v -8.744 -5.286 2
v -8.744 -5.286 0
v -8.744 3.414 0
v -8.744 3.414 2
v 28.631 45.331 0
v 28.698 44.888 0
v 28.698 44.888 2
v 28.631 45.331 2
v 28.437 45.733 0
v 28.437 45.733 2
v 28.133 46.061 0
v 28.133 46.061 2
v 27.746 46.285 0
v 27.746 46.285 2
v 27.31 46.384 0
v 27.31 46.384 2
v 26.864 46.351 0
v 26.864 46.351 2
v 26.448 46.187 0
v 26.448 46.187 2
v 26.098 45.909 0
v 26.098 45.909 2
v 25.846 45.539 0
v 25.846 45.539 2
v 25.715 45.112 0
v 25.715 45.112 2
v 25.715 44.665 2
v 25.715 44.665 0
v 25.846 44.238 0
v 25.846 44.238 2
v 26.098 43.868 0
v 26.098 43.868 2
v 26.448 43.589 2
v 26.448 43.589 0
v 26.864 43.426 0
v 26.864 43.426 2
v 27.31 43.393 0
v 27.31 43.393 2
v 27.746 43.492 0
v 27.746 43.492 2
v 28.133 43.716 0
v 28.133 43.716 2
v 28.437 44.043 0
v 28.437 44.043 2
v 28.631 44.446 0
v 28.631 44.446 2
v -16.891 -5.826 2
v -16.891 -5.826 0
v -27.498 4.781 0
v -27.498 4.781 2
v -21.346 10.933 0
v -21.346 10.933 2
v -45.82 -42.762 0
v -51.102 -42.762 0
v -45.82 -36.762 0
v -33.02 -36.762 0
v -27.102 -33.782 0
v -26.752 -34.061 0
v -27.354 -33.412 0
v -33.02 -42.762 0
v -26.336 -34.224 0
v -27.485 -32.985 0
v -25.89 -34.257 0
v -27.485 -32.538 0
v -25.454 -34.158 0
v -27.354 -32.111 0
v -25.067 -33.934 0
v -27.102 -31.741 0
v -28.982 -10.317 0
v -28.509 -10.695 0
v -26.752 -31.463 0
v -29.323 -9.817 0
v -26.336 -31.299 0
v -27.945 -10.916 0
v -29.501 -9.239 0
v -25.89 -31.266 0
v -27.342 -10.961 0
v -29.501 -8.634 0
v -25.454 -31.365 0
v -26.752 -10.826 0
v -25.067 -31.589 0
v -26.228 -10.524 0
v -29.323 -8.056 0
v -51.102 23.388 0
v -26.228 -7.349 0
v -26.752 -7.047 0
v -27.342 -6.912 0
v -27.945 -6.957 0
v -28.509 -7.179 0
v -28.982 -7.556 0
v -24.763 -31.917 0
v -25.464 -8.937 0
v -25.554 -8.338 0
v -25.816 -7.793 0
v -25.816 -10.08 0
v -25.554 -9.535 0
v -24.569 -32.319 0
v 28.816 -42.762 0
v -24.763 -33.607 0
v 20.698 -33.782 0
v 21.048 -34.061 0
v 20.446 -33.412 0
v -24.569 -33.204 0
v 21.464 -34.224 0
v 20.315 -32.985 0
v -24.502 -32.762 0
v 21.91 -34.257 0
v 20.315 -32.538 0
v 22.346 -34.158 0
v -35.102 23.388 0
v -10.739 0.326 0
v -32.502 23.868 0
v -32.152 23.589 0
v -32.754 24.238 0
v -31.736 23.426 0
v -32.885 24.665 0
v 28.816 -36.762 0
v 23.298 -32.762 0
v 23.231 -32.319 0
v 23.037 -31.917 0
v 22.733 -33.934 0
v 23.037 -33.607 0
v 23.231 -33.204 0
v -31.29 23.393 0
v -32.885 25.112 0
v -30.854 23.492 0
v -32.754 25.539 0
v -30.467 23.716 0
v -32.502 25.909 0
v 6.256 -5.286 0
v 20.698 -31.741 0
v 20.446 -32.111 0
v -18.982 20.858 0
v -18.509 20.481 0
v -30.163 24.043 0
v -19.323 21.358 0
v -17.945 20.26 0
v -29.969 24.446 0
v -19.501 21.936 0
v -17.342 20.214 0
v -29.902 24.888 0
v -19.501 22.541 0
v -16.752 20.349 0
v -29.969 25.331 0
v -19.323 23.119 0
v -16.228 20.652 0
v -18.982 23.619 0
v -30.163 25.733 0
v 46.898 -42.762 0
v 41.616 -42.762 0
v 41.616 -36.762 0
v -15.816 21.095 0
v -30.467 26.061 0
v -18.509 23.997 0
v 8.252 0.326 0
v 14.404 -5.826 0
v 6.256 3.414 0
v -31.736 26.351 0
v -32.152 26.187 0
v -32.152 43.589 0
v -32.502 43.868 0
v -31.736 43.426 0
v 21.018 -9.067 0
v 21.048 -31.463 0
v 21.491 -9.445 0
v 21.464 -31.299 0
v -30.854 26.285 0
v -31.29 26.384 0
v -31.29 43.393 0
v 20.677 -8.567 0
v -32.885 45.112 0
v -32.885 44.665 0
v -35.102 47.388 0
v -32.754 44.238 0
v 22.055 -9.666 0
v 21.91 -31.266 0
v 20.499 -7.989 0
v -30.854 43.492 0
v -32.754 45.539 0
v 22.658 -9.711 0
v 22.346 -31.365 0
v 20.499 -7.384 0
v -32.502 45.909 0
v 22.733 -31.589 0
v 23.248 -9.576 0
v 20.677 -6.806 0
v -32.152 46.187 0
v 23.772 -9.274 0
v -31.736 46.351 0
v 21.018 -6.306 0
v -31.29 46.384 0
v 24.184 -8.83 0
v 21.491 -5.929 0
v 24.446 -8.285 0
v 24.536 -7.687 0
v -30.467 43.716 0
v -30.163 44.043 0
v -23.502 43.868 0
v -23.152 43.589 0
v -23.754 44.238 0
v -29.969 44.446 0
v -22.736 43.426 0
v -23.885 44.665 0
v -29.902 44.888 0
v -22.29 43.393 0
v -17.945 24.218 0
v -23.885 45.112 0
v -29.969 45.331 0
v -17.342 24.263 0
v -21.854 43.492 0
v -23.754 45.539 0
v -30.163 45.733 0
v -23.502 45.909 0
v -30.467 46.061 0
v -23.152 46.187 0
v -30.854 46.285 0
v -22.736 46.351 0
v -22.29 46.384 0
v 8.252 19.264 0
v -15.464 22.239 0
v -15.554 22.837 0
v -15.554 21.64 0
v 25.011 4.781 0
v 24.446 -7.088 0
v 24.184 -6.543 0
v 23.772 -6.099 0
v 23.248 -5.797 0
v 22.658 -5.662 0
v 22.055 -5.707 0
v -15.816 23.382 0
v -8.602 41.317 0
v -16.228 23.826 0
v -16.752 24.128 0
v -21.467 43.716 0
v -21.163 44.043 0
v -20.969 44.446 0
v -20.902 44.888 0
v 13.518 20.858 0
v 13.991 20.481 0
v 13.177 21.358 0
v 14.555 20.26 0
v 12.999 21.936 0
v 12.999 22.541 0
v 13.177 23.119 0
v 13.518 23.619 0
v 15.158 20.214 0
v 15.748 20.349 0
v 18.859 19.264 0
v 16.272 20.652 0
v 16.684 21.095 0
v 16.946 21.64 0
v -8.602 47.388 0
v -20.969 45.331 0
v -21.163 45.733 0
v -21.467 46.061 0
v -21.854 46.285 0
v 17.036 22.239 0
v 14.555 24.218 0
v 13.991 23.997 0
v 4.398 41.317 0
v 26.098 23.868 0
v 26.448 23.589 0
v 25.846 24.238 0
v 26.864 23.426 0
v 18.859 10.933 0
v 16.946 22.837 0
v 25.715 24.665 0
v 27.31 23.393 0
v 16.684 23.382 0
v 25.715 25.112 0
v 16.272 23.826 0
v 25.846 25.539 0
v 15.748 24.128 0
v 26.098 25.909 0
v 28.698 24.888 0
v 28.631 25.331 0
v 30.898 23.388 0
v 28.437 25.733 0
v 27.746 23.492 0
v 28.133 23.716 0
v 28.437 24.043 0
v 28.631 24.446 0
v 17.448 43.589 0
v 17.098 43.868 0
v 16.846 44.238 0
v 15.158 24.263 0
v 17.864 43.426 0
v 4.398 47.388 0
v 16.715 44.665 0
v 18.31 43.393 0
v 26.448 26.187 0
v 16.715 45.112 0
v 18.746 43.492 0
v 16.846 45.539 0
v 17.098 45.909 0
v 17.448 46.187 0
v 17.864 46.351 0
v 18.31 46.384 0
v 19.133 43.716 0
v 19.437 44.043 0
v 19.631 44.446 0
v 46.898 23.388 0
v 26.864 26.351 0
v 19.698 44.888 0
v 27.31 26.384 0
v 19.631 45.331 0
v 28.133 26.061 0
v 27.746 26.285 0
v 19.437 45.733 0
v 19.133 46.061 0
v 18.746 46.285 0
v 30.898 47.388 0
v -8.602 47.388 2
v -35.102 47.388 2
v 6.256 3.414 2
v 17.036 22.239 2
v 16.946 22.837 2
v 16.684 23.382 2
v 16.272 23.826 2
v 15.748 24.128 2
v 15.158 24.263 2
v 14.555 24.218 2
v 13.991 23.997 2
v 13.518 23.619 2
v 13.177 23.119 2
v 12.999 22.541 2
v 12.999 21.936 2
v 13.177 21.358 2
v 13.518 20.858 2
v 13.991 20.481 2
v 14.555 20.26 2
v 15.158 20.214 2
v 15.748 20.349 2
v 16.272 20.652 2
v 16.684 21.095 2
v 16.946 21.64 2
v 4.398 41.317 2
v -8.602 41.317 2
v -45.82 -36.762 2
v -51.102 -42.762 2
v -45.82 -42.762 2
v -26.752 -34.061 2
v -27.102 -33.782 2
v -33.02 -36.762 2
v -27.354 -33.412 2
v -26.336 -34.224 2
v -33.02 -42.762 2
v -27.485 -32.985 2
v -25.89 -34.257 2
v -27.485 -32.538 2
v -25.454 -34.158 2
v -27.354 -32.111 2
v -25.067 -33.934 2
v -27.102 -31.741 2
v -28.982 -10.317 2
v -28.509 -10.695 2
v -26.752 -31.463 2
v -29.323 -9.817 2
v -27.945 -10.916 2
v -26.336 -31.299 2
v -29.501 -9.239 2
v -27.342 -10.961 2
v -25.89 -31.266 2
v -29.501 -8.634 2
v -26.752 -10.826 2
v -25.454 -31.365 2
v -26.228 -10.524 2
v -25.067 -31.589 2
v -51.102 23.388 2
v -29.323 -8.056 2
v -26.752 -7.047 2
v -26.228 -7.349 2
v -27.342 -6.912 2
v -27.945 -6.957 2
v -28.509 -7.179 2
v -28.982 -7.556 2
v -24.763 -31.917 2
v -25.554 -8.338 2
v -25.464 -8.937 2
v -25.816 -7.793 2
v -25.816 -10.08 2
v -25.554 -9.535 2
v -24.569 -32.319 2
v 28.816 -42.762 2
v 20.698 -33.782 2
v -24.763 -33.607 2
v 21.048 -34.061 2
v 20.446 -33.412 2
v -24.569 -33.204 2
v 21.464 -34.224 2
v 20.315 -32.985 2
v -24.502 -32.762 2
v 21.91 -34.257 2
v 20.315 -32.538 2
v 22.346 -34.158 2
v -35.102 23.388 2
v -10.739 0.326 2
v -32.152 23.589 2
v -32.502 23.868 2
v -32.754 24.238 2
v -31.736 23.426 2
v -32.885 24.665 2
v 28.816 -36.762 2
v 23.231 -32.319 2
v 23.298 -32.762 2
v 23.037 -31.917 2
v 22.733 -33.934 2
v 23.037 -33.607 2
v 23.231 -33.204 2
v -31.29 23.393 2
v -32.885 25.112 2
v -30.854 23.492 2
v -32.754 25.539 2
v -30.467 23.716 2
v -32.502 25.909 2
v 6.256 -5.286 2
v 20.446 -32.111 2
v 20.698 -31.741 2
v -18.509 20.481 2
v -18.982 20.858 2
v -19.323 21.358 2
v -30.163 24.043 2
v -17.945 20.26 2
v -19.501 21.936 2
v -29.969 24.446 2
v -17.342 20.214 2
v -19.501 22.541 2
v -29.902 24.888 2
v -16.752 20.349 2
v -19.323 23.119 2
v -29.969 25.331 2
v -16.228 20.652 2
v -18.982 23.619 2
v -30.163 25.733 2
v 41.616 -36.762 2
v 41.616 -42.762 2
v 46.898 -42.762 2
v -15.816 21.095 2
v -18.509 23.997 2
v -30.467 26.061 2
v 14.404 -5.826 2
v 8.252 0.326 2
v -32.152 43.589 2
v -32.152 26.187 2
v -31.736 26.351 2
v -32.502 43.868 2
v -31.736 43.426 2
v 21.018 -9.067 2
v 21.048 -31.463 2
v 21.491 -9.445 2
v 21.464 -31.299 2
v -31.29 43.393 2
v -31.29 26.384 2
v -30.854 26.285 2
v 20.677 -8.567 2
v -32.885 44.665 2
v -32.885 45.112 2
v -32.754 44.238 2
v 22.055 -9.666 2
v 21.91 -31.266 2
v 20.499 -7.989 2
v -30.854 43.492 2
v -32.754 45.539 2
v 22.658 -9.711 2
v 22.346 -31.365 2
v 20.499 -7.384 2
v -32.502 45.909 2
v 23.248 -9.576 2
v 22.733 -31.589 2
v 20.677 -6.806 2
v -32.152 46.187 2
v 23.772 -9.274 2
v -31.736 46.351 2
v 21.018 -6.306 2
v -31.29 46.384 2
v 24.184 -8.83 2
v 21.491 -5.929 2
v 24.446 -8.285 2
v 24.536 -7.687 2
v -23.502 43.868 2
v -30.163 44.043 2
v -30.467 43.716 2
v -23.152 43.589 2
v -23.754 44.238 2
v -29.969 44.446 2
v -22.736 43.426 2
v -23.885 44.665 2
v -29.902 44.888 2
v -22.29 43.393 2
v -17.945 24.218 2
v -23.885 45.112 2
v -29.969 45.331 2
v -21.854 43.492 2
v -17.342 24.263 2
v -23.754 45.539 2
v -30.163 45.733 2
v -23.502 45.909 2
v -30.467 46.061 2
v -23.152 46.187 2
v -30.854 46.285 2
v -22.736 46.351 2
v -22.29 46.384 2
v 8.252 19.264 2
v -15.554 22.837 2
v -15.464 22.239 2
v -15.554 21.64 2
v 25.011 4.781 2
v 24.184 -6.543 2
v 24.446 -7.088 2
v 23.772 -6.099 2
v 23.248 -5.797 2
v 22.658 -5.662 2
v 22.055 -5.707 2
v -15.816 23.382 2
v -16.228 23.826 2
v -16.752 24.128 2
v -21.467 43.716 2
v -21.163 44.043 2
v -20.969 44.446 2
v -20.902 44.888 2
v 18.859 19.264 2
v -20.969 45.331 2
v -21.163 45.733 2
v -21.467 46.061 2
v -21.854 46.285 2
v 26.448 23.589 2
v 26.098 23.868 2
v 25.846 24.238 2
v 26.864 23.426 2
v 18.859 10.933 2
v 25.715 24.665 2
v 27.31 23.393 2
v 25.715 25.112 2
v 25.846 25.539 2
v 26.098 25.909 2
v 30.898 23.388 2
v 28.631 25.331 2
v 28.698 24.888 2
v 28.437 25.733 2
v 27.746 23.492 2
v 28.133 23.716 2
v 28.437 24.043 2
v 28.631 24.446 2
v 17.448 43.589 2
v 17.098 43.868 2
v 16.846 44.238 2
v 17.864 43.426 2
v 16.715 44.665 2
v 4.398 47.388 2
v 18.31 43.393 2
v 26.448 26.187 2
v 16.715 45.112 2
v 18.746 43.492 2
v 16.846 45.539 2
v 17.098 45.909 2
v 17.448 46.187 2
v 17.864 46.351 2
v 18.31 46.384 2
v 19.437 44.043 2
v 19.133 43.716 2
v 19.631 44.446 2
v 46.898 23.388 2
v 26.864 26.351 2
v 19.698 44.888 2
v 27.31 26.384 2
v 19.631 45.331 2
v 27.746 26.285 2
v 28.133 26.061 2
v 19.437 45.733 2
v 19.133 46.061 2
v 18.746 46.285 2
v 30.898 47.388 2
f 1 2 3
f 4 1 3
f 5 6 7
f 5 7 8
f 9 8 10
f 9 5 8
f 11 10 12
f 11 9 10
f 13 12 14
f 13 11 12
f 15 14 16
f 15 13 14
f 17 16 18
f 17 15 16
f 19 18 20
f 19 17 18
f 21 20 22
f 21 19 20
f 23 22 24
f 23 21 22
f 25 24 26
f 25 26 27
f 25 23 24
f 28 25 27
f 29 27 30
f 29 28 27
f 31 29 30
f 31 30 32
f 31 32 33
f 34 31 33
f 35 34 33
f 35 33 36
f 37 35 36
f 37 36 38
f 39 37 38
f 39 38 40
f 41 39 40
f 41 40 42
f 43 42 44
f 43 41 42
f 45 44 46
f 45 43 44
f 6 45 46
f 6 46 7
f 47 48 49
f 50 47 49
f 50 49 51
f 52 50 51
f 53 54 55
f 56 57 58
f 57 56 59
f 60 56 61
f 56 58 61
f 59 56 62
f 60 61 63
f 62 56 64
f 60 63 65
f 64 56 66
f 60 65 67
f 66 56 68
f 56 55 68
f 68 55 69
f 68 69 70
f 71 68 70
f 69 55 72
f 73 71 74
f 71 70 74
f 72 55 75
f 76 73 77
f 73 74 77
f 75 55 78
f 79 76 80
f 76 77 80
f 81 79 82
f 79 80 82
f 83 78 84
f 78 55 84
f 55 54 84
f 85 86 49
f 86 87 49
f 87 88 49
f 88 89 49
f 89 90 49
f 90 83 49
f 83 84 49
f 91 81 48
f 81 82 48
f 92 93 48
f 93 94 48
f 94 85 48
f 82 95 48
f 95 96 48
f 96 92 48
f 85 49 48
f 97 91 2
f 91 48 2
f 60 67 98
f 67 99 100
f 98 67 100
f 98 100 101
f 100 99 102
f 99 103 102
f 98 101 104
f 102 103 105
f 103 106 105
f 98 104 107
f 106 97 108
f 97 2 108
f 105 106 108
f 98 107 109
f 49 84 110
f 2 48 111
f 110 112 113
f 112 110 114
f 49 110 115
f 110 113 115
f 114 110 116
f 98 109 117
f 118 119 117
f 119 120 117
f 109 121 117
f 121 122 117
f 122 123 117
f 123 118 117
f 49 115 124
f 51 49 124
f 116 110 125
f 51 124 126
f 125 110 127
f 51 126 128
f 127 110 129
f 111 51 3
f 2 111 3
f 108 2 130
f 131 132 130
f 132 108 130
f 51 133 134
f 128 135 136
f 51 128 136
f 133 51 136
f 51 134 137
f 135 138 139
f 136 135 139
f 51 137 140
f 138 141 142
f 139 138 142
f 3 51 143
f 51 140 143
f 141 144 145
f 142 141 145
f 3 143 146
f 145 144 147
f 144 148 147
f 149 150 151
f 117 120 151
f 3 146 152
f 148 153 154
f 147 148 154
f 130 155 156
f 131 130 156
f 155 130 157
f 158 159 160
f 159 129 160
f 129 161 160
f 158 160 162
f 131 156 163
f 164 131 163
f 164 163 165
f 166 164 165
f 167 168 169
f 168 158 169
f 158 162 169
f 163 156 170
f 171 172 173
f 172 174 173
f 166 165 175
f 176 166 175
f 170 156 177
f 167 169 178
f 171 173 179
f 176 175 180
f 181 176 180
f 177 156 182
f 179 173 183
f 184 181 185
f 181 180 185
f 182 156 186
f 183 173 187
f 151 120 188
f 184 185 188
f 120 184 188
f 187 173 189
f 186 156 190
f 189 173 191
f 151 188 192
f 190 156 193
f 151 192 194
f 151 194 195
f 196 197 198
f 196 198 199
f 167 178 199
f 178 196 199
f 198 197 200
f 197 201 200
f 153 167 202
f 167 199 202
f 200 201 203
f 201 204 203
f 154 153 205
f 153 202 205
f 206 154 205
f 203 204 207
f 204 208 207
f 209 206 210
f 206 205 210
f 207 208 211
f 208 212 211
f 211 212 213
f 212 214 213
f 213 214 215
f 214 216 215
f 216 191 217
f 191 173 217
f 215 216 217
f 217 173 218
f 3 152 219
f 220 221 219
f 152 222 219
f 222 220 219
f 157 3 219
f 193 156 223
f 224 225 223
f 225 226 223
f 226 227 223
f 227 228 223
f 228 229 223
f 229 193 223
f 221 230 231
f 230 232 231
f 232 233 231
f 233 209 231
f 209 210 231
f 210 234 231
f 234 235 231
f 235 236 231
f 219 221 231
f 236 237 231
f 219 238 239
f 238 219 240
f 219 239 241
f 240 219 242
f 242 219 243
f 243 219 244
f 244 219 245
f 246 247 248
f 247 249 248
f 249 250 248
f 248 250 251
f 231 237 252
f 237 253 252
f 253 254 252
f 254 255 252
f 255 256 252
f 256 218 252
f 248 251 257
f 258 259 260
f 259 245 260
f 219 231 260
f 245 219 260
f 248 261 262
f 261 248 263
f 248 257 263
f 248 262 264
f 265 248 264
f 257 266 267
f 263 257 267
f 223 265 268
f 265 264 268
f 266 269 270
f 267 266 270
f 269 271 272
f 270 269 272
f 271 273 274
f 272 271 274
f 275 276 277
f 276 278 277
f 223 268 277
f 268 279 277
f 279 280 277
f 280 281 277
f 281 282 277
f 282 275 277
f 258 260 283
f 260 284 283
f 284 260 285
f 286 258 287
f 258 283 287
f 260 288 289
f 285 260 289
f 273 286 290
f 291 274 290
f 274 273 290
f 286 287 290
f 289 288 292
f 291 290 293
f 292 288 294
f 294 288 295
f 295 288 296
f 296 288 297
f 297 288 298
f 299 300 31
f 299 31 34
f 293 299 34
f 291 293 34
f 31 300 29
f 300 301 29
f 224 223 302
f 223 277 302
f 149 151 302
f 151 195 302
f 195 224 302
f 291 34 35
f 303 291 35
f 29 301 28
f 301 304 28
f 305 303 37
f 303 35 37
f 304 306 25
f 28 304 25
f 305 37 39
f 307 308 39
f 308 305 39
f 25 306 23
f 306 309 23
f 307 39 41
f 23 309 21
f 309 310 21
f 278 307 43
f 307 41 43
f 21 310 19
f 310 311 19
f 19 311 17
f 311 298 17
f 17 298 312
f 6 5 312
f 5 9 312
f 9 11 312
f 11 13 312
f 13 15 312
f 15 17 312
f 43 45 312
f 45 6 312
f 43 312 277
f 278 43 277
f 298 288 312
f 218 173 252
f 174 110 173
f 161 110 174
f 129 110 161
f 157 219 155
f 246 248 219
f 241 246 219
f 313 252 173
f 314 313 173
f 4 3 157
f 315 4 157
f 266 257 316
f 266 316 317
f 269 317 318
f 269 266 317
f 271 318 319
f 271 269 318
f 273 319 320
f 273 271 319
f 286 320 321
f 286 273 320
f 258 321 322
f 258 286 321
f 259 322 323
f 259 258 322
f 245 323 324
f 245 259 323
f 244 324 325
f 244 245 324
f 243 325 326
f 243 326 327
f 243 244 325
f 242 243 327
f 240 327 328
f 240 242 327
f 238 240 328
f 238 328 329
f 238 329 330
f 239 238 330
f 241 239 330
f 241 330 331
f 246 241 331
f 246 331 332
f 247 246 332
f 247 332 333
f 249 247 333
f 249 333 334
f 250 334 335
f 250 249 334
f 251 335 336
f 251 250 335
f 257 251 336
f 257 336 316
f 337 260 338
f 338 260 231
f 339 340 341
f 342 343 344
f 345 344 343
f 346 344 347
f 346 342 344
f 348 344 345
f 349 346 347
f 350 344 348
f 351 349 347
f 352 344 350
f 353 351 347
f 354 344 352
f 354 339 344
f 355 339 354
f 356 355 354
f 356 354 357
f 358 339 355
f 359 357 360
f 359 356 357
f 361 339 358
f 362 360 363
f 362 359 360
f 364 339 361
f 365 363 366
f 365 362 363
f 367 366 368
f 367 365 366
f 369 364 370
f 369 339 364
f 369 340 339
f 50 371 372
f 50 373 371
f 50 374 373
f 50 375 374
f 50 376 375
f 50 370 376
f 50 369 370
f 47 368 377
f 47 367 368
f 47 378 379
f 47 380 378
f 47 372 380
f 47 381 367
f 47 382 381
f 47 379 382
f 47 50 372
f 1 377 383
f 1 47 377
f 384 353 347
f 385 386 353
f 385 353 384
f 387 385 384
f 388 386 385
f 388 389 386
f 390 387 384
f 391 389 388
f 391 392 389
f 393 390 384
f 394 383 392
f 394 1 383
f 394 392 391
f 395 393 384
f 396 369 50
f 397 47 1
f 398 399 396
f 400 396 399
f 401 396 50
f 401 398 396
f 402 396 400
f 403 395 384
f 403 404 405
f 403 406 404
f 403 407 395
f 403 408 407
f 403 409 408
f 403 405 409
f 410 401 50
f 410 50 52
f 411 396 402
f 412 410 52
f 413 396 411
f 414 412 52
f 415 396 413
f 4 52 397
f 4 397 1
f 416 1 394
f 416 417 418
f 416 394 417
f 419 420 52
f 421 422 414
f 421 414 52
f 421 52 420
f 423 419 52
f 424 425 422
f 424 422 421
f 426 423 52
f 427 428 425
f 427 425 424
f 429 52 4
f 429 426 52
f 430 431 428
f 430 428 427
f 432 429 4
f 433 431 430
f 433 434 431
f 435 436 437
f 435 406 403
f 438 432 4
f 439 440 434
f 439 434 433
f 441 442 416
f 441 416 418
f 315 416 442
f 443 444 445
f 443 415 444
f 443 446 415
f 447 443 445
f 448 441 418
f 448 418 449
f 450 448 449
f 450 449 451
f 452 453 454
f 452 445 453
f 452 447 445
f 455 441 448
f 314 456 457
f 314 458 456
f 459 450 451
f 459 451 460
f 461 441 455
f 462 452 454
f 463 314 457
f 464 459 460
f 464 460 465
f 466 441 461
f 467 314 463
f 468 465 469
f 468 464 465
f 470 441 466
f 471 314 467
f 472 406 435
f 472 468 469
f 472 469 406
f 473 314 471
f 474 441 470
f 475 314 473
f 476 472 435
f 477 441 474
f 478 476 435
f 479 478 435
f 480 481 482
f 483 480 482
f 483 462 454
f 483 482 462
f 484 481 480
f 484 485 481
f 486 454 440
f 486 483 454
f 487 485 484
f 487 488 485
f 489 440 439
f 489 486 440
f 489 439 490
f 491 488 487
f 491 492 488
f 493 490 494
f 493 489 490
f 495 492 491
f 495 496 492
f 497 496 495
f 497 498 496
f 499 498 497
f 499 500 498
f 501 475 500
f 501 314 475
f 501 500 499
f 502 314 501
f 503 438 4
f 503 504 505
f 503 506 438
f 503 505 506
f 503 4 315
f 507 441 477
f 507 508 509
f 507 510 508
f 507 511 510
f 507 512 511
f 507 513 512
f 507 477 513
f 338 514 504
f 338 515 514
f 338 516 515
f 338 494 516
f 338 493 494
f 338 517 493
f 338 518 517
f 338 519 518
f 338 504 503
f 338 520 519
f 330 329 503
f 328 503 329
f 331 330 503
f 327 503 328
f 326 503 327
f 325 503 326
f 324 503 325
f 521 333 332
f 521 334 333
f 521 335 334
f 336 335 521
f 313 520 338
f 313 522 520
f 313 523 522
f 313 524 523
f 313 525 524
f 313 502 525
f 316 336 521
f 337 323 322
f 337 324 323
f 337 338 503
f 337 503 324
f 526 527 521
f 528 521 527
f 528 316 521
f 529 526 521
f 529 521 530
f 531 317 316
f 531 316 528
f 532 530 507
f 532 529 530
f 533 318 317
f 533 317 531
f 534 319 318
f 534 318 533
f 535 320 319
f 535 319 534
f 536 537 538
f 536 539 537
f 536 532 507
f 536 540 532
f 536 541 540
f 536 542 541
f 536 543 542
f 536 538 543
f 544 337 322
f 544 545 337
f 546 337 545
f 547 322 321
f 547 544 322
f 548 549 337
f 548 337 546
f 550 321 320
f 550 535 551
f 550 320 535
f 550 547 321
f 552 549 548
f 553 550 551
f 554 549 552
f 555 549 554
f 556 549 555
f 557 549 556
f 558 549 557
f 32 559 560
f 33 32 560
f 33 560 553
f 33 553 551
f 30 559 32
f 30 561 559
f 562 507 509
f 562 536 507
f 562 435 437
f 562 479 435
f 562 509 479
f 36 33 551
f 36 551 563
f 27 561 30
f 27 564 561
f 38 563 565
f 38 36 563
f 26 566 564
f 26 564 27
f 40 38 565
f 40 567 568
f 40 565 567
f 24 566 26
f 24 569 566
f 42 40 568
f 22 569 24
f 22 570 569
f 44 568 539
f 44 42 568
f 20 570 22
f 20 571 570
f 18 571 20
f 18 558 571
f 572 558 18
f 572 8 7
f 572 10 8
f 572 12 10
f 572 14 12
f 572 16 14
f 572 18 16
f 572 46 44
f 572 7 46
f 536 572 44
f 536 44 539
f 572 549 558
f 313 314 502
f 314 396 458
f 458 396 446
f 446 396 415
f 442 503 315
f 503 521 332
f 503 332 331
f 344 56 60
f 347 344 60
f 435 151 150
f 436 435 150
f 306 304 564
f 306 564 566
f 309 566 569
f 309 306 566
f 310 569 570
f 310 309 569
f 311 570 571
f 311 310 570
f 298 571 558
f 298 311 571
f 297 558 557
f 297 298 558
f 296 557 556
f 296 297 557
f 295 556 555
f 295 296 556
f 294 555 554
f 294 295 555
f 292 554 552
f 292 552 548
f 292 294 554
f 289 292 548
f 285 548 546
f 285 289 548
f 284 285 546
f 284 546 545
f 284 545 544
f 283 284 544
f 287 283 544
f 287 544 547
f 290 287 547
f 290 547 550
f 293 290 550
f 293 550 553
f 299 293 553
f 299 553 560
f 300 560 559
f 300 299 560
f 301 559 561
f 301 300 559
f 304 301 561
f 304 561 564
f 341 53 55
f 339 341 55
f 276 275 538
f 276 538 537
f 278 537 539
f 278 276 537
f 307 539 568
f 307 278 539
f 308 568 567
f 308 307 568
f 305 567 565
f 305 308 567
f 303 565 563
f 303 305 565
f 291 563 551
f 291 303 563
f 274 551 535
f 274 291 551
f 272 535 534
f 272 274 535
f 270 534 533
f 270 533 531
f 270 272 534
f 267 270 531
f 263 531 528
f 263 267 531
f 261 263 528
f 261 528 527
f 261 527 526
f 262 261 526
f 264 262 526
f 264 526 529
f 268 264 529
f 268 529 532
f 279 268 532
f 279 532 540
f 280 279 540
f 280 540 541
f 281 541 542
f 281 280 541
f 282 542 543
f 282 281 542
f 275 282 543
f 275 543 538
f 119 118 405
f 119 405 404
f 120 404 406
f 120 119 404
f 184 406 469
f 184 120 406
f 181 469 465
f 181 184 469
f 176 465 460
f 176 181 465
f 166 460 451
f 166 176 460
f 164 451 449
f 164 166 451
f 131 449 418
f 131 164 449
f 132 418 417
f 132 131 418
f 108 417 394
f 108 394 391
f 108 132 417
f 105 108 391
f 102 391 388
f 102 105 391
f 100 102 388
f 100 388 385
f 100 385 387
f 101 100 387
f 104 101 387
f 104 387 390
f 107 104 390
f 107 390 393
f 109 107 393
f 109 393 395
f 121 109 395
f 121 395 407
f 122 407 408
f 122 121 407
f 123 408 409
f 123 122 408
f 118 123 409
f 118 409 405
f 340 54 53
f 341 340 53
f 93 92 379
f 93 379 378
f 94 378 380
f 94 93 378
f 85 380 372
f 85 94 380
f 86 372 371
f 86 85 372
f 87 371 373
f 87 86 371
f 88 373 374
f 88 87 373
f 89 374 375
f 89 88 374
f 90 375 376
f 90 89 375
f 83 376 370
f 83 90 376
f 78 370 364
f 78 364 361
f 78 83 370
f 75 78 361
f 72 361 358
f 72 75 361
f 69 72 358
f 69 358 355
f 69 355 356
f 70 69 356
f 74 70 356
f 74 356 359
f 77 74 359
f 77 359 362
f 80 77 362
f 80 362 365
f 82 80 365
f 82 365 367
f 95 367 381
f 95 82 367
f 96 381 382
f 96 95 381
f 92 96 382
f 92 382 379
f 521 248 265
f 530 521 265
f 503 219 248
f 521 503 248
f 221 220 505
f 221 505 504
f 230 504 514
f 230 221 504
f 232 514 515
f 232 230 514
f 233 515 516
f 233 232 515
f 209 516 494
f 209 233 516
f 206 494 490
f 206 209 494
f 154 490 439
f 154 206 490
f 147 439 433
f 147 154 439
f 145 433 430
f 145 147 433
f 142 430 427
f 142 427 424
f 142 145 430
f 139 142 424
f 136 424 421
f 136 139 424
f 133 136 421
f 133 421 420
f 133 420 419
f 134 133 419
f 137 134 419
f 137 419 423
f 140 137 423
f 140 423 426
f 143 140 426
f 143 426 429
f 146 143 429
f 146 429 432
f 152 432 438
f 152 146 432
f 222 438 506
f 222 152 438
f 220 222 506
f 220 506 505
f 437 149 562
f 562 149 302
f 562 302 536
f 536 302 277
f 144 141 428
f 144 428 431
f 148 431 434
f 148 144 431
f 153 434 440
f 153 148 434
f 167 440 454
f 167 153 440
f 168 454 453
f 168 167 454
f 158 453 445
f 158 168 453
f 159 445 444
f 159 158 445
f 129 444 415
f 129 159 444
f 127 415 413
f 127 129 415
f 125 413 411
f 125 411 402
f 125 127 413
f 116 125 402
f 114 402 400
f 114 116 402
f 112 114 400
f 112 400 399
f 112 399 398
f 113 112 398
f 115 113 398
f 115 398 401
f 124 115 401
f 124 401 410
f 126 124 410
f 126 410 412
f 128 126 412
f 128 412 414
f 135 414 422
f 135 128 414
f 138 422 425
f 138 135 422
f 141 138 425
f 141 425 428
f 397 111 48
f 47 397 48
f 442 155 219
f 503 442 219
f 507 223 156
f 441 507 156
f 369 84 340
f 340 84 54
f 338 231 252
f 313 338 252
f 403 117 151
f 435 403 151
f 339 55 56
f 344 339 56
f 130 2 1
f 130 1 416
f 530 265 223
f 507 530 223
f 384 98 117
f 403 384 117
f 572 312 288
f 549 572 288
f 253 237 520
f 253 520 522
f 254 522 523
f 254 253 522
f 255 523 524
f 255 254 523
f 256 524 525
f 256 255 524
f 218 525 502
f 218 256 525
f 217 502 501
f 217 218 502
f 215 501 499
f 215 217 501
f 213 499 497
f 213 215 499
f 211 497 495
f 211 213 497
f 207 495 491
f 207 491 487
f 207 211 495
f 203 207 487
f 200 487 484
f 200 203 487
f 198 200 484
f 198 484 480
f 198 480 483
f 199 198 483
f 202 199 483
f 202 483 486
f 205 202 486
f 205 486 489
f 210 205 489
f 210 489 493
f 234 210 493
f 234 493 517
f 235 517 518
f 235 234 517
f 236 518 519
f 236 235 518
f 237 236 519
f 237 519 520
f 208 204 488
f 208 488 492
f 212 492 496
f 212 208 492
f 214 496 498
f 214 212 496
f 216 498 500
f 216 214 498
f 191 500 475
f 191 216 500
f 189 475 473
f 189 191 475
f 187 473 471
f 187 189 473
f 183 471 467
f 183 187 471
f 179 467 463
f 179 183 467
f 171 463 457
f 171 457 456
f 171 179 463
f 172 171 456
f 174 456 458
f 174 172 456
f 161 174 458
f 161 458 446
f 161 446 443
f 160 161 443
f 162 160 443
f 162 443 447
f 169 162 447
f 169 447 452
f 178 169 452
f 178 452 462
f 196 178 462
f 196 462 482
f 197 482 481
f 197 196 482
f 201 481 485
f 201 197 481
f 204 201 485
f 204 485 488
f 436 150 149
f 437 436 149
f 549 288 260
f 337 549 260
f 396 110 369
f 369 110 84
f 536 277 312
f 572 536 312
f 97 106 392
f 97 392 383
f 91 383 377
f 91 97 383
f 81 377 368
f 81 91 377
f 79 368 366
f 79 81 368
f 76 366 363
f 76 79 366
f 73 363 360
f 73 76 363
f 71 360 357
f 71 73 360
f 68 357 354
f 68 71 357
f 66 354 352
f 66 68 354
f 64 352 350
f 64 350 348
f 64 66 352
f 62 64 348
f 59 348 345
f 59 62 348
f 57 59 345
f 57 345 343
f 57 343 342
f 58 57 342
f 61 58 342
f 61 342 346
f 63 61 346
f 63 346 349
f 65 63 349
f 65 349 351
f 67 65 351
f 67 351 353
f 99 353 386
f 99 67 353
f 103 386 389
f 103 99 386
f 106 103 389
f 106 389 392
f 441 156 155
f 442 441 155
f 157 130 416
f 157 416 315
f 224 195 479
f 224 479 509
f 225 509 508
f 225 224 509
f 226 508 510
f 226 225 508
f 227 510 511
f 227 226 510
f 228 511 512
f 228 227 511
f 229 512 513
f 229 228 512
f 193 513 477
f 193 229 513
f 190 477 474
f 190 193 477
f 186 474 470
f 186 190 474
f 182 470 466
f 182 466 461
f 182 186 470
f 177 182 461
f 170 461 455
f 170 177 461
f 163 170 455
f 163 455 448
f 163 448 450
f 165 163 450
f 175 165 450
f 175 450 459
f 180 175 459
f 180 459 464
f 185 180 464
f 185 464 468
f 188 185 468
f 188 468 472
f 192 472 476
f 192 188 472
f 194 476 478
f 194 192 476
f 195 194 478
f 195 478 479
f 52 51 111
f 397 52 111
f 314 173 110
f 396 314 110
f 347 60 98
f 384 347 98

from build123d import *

# Parameters (mm, degrees)
F0_R     = 1.5
F0_R_2   = 2.03
F0_W     = 15
F0_H     = 8.7
F1_DEPTH = 2


with BuildPart() as f1:
    # F0 (on Top) → F1 (new body)
    with BuildSketch(Plane.XY):
        Polygon((41.615864, -42.761541), (46.897838, -42.761541), (46.897838, 23.388459), (30.897838, 23.388459), (30.897838, 47.388459), (4.397838, 47.388459), (4.397838, 41.317214), (-8.602162, 41.317214), (-8.602162, 47.388459), (-35.102162, 47.388459), (-35.102162, 23.388459), (-51.102162, 23.388459), (-51.102162, -42.761541), (-45.820188, -42.761541), (-45.820188, -36.761541), (-33.020188, -36.761541), (-33.020188, -42.761541), (28.815864, -42.761541), (28.815864, -36.761541), (41.615864, -36.761541), align=None)
        with Locations((-26.002162, -32.761541)):
            Circle(F0_R, mode=Mode.SUBTRACT)
        with Locations((-27.493694, -8.936541)):
            Circle(F0_R_2, mode=Mode.SUBTRACT)
        with Locations((21.797838, -32.761541)):
            Circle(F0_R, mode=Mode.SUBTRACT)
        with Locations((-1.243694, -0.936335)):
            Rectangle(F0_W, F0_H, mode=Mode.SUBTRACT)
        with Locations((22.506306, -7.686541)):
            Circle(F0_R_2, mode=Mode.SUBTRACT)
        Polygon((-21.34608, 10.93288), (-10.739479, 0.326279), (-16.891308, -5.82555), (-27.497909, 4.781051), align=None, mode=Mode.SUBTRACT)
        with Locations((-17.493694, 22.238665)):
            Circle(F0_R_2, mode=Mode.SUBTRACT)
        with Locations((-31.402162, 24.888459)):
            Circle(F0_R, mode=Mode.SUBTRACT)
        with Locations((-31.402162, 44.888459)):
            Circle(F0_R, mode=Mode.SUBTRACT)
        with Locations((-22.402162, 44.888459)):
            Circle(F0_R, mode=Mode.SUBTRACT)
        Polygon((14.40392, -5.82555), (8.252091, 0.326279), (8.252091, 19.263665), (18.858692, 19.263665), (18.858692, 10.93288), (25.010521, 4.781051), align=None, mode=Mode.SUBTRACT)
        with Locations((15.006306, 22.238665)):
            Circle(F0_R_2, mode=Mode.SUBTRACT)
        with Locations((18.197838, 44.888459)):
            Circle(F0_R, mode=Mode.SUBTRACT)
        with Locations((27.197838, 24.888459)):
            Circle(F0_R, mode=Mode.SUBTRACT)
        with Locations((27.197838, 44.888459)):
            Circle(F0_R, mode=Mode.SUBTRACT)
    extrude(amount=F1_DEPTH)


solid = f1.part
